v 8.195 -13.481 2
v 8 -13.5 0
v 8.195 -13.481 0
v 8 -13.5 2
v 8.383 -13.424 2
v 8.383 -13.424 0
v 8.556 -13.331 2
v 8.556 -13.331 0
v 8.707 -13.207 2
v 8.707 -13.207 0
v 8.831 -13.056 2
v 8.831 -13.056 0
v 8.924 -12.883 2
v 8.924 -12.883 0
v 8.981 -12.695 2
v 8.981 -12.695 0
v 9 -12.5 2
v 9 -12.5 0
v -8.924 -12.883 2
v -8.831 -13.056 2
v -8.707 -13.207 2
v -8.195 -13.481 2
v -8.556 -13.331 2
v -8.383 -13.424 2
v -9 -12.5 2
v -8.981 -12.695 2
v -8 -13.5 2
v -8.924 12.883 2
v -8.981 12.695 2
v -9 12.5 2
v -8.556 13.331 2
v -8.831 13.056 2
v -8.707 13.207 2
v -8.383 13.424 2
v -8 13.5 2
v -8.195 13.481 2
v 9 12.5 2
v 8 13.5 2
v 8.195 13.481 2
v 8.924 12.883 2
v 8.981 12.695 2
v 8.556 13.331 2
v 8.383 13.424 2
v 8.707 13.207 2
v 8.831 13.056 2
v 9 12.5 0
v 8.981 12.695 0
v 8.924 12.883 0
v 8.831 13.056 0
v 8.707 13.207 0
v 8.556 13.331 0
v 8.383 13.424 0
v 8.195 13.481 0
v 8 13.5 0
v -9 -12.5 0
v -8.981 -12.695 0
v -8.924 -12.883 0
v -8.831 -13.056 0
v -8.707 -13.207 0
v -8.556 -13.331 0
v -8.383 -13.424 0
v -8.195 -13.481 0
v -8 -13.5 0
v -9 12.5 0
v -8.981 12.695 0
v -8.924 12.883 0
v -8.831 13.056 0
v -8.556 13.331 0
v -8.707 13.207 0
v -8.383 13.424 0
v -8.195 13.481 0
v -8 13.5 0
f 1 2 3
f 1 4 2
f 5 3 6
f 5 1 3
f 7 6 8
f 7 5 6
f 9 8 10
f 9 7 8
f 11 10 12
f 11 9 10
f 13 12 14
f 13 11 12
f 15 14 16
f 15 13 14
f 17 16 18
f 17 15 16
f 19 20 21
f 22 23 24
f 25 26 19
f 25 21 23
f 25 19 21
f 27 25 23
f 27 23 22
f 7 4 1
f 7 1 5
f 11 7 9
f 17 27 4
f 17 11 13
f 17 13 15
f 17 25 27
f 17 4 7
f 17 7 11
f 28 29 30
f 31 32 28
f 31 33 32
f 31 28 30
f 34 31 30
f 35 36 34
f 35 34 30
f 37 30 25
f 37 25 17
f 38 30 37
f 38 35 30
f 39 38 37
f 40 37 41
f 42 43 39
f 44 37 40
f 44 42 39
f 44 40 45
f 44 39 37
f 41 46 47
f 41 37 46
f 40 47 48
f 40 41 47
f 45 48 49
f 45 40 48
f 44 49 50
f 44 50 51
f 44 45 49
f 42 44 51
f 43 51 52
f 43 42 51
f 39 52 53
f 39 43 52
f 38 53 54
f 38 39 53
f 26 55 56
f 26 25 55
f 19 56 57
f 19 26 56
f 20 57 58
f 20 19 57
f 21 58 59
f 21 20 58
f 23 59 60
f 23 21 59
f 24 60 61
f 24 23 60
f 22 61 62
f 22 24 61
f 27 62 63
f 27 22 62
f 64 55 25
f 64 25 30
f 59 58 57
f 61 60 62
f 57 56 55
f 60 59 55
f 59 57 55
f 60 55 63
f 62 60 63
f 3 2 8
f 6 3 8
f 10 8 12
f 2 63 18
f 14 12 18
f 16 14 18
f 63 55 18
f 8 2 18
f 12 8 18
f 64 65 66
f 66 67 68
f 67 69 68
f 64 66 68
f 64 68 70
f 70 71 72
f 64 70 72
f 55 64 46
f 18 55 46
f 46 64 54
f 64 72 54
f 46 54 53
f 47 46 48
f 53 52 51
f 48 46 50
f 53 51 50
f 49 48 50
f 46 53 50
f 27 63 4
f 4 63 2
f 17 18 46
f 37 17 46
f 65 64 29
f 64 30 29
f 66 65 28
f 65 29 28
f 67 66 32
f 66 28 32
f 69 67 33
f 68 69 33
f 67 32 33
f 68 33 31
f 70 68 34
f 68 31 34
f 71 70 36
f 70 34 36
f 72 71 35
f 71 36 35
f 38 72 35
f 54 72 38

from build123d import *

# Parameters (mm, degrees)
SKETCH1_W  = 18
SKETCH1_H  = 27
BASE_DEPTH = 2
FILLET_2_R = 1


with BuildPart() as part:
    # Sketch1 → Base (new body)
    with BuildSketch(Plane.XY):
        Rectangle(SKETCH1_W, SKETCH1_H)
    extrude(amount=BASE_DEPTH)

    # Fillet 2
    fillet_2_edges = [part.edges().sort_by_distance(p)[0] for p in [
        (-9, 13.5, 1),
        (9, 13.5, 1),
        (9, -13.5, 1),
        (-9, -13.5, 1),
    ]]
    fillet(fillet_2_edges, radius=FILLET_2_R)


solid = part.part
